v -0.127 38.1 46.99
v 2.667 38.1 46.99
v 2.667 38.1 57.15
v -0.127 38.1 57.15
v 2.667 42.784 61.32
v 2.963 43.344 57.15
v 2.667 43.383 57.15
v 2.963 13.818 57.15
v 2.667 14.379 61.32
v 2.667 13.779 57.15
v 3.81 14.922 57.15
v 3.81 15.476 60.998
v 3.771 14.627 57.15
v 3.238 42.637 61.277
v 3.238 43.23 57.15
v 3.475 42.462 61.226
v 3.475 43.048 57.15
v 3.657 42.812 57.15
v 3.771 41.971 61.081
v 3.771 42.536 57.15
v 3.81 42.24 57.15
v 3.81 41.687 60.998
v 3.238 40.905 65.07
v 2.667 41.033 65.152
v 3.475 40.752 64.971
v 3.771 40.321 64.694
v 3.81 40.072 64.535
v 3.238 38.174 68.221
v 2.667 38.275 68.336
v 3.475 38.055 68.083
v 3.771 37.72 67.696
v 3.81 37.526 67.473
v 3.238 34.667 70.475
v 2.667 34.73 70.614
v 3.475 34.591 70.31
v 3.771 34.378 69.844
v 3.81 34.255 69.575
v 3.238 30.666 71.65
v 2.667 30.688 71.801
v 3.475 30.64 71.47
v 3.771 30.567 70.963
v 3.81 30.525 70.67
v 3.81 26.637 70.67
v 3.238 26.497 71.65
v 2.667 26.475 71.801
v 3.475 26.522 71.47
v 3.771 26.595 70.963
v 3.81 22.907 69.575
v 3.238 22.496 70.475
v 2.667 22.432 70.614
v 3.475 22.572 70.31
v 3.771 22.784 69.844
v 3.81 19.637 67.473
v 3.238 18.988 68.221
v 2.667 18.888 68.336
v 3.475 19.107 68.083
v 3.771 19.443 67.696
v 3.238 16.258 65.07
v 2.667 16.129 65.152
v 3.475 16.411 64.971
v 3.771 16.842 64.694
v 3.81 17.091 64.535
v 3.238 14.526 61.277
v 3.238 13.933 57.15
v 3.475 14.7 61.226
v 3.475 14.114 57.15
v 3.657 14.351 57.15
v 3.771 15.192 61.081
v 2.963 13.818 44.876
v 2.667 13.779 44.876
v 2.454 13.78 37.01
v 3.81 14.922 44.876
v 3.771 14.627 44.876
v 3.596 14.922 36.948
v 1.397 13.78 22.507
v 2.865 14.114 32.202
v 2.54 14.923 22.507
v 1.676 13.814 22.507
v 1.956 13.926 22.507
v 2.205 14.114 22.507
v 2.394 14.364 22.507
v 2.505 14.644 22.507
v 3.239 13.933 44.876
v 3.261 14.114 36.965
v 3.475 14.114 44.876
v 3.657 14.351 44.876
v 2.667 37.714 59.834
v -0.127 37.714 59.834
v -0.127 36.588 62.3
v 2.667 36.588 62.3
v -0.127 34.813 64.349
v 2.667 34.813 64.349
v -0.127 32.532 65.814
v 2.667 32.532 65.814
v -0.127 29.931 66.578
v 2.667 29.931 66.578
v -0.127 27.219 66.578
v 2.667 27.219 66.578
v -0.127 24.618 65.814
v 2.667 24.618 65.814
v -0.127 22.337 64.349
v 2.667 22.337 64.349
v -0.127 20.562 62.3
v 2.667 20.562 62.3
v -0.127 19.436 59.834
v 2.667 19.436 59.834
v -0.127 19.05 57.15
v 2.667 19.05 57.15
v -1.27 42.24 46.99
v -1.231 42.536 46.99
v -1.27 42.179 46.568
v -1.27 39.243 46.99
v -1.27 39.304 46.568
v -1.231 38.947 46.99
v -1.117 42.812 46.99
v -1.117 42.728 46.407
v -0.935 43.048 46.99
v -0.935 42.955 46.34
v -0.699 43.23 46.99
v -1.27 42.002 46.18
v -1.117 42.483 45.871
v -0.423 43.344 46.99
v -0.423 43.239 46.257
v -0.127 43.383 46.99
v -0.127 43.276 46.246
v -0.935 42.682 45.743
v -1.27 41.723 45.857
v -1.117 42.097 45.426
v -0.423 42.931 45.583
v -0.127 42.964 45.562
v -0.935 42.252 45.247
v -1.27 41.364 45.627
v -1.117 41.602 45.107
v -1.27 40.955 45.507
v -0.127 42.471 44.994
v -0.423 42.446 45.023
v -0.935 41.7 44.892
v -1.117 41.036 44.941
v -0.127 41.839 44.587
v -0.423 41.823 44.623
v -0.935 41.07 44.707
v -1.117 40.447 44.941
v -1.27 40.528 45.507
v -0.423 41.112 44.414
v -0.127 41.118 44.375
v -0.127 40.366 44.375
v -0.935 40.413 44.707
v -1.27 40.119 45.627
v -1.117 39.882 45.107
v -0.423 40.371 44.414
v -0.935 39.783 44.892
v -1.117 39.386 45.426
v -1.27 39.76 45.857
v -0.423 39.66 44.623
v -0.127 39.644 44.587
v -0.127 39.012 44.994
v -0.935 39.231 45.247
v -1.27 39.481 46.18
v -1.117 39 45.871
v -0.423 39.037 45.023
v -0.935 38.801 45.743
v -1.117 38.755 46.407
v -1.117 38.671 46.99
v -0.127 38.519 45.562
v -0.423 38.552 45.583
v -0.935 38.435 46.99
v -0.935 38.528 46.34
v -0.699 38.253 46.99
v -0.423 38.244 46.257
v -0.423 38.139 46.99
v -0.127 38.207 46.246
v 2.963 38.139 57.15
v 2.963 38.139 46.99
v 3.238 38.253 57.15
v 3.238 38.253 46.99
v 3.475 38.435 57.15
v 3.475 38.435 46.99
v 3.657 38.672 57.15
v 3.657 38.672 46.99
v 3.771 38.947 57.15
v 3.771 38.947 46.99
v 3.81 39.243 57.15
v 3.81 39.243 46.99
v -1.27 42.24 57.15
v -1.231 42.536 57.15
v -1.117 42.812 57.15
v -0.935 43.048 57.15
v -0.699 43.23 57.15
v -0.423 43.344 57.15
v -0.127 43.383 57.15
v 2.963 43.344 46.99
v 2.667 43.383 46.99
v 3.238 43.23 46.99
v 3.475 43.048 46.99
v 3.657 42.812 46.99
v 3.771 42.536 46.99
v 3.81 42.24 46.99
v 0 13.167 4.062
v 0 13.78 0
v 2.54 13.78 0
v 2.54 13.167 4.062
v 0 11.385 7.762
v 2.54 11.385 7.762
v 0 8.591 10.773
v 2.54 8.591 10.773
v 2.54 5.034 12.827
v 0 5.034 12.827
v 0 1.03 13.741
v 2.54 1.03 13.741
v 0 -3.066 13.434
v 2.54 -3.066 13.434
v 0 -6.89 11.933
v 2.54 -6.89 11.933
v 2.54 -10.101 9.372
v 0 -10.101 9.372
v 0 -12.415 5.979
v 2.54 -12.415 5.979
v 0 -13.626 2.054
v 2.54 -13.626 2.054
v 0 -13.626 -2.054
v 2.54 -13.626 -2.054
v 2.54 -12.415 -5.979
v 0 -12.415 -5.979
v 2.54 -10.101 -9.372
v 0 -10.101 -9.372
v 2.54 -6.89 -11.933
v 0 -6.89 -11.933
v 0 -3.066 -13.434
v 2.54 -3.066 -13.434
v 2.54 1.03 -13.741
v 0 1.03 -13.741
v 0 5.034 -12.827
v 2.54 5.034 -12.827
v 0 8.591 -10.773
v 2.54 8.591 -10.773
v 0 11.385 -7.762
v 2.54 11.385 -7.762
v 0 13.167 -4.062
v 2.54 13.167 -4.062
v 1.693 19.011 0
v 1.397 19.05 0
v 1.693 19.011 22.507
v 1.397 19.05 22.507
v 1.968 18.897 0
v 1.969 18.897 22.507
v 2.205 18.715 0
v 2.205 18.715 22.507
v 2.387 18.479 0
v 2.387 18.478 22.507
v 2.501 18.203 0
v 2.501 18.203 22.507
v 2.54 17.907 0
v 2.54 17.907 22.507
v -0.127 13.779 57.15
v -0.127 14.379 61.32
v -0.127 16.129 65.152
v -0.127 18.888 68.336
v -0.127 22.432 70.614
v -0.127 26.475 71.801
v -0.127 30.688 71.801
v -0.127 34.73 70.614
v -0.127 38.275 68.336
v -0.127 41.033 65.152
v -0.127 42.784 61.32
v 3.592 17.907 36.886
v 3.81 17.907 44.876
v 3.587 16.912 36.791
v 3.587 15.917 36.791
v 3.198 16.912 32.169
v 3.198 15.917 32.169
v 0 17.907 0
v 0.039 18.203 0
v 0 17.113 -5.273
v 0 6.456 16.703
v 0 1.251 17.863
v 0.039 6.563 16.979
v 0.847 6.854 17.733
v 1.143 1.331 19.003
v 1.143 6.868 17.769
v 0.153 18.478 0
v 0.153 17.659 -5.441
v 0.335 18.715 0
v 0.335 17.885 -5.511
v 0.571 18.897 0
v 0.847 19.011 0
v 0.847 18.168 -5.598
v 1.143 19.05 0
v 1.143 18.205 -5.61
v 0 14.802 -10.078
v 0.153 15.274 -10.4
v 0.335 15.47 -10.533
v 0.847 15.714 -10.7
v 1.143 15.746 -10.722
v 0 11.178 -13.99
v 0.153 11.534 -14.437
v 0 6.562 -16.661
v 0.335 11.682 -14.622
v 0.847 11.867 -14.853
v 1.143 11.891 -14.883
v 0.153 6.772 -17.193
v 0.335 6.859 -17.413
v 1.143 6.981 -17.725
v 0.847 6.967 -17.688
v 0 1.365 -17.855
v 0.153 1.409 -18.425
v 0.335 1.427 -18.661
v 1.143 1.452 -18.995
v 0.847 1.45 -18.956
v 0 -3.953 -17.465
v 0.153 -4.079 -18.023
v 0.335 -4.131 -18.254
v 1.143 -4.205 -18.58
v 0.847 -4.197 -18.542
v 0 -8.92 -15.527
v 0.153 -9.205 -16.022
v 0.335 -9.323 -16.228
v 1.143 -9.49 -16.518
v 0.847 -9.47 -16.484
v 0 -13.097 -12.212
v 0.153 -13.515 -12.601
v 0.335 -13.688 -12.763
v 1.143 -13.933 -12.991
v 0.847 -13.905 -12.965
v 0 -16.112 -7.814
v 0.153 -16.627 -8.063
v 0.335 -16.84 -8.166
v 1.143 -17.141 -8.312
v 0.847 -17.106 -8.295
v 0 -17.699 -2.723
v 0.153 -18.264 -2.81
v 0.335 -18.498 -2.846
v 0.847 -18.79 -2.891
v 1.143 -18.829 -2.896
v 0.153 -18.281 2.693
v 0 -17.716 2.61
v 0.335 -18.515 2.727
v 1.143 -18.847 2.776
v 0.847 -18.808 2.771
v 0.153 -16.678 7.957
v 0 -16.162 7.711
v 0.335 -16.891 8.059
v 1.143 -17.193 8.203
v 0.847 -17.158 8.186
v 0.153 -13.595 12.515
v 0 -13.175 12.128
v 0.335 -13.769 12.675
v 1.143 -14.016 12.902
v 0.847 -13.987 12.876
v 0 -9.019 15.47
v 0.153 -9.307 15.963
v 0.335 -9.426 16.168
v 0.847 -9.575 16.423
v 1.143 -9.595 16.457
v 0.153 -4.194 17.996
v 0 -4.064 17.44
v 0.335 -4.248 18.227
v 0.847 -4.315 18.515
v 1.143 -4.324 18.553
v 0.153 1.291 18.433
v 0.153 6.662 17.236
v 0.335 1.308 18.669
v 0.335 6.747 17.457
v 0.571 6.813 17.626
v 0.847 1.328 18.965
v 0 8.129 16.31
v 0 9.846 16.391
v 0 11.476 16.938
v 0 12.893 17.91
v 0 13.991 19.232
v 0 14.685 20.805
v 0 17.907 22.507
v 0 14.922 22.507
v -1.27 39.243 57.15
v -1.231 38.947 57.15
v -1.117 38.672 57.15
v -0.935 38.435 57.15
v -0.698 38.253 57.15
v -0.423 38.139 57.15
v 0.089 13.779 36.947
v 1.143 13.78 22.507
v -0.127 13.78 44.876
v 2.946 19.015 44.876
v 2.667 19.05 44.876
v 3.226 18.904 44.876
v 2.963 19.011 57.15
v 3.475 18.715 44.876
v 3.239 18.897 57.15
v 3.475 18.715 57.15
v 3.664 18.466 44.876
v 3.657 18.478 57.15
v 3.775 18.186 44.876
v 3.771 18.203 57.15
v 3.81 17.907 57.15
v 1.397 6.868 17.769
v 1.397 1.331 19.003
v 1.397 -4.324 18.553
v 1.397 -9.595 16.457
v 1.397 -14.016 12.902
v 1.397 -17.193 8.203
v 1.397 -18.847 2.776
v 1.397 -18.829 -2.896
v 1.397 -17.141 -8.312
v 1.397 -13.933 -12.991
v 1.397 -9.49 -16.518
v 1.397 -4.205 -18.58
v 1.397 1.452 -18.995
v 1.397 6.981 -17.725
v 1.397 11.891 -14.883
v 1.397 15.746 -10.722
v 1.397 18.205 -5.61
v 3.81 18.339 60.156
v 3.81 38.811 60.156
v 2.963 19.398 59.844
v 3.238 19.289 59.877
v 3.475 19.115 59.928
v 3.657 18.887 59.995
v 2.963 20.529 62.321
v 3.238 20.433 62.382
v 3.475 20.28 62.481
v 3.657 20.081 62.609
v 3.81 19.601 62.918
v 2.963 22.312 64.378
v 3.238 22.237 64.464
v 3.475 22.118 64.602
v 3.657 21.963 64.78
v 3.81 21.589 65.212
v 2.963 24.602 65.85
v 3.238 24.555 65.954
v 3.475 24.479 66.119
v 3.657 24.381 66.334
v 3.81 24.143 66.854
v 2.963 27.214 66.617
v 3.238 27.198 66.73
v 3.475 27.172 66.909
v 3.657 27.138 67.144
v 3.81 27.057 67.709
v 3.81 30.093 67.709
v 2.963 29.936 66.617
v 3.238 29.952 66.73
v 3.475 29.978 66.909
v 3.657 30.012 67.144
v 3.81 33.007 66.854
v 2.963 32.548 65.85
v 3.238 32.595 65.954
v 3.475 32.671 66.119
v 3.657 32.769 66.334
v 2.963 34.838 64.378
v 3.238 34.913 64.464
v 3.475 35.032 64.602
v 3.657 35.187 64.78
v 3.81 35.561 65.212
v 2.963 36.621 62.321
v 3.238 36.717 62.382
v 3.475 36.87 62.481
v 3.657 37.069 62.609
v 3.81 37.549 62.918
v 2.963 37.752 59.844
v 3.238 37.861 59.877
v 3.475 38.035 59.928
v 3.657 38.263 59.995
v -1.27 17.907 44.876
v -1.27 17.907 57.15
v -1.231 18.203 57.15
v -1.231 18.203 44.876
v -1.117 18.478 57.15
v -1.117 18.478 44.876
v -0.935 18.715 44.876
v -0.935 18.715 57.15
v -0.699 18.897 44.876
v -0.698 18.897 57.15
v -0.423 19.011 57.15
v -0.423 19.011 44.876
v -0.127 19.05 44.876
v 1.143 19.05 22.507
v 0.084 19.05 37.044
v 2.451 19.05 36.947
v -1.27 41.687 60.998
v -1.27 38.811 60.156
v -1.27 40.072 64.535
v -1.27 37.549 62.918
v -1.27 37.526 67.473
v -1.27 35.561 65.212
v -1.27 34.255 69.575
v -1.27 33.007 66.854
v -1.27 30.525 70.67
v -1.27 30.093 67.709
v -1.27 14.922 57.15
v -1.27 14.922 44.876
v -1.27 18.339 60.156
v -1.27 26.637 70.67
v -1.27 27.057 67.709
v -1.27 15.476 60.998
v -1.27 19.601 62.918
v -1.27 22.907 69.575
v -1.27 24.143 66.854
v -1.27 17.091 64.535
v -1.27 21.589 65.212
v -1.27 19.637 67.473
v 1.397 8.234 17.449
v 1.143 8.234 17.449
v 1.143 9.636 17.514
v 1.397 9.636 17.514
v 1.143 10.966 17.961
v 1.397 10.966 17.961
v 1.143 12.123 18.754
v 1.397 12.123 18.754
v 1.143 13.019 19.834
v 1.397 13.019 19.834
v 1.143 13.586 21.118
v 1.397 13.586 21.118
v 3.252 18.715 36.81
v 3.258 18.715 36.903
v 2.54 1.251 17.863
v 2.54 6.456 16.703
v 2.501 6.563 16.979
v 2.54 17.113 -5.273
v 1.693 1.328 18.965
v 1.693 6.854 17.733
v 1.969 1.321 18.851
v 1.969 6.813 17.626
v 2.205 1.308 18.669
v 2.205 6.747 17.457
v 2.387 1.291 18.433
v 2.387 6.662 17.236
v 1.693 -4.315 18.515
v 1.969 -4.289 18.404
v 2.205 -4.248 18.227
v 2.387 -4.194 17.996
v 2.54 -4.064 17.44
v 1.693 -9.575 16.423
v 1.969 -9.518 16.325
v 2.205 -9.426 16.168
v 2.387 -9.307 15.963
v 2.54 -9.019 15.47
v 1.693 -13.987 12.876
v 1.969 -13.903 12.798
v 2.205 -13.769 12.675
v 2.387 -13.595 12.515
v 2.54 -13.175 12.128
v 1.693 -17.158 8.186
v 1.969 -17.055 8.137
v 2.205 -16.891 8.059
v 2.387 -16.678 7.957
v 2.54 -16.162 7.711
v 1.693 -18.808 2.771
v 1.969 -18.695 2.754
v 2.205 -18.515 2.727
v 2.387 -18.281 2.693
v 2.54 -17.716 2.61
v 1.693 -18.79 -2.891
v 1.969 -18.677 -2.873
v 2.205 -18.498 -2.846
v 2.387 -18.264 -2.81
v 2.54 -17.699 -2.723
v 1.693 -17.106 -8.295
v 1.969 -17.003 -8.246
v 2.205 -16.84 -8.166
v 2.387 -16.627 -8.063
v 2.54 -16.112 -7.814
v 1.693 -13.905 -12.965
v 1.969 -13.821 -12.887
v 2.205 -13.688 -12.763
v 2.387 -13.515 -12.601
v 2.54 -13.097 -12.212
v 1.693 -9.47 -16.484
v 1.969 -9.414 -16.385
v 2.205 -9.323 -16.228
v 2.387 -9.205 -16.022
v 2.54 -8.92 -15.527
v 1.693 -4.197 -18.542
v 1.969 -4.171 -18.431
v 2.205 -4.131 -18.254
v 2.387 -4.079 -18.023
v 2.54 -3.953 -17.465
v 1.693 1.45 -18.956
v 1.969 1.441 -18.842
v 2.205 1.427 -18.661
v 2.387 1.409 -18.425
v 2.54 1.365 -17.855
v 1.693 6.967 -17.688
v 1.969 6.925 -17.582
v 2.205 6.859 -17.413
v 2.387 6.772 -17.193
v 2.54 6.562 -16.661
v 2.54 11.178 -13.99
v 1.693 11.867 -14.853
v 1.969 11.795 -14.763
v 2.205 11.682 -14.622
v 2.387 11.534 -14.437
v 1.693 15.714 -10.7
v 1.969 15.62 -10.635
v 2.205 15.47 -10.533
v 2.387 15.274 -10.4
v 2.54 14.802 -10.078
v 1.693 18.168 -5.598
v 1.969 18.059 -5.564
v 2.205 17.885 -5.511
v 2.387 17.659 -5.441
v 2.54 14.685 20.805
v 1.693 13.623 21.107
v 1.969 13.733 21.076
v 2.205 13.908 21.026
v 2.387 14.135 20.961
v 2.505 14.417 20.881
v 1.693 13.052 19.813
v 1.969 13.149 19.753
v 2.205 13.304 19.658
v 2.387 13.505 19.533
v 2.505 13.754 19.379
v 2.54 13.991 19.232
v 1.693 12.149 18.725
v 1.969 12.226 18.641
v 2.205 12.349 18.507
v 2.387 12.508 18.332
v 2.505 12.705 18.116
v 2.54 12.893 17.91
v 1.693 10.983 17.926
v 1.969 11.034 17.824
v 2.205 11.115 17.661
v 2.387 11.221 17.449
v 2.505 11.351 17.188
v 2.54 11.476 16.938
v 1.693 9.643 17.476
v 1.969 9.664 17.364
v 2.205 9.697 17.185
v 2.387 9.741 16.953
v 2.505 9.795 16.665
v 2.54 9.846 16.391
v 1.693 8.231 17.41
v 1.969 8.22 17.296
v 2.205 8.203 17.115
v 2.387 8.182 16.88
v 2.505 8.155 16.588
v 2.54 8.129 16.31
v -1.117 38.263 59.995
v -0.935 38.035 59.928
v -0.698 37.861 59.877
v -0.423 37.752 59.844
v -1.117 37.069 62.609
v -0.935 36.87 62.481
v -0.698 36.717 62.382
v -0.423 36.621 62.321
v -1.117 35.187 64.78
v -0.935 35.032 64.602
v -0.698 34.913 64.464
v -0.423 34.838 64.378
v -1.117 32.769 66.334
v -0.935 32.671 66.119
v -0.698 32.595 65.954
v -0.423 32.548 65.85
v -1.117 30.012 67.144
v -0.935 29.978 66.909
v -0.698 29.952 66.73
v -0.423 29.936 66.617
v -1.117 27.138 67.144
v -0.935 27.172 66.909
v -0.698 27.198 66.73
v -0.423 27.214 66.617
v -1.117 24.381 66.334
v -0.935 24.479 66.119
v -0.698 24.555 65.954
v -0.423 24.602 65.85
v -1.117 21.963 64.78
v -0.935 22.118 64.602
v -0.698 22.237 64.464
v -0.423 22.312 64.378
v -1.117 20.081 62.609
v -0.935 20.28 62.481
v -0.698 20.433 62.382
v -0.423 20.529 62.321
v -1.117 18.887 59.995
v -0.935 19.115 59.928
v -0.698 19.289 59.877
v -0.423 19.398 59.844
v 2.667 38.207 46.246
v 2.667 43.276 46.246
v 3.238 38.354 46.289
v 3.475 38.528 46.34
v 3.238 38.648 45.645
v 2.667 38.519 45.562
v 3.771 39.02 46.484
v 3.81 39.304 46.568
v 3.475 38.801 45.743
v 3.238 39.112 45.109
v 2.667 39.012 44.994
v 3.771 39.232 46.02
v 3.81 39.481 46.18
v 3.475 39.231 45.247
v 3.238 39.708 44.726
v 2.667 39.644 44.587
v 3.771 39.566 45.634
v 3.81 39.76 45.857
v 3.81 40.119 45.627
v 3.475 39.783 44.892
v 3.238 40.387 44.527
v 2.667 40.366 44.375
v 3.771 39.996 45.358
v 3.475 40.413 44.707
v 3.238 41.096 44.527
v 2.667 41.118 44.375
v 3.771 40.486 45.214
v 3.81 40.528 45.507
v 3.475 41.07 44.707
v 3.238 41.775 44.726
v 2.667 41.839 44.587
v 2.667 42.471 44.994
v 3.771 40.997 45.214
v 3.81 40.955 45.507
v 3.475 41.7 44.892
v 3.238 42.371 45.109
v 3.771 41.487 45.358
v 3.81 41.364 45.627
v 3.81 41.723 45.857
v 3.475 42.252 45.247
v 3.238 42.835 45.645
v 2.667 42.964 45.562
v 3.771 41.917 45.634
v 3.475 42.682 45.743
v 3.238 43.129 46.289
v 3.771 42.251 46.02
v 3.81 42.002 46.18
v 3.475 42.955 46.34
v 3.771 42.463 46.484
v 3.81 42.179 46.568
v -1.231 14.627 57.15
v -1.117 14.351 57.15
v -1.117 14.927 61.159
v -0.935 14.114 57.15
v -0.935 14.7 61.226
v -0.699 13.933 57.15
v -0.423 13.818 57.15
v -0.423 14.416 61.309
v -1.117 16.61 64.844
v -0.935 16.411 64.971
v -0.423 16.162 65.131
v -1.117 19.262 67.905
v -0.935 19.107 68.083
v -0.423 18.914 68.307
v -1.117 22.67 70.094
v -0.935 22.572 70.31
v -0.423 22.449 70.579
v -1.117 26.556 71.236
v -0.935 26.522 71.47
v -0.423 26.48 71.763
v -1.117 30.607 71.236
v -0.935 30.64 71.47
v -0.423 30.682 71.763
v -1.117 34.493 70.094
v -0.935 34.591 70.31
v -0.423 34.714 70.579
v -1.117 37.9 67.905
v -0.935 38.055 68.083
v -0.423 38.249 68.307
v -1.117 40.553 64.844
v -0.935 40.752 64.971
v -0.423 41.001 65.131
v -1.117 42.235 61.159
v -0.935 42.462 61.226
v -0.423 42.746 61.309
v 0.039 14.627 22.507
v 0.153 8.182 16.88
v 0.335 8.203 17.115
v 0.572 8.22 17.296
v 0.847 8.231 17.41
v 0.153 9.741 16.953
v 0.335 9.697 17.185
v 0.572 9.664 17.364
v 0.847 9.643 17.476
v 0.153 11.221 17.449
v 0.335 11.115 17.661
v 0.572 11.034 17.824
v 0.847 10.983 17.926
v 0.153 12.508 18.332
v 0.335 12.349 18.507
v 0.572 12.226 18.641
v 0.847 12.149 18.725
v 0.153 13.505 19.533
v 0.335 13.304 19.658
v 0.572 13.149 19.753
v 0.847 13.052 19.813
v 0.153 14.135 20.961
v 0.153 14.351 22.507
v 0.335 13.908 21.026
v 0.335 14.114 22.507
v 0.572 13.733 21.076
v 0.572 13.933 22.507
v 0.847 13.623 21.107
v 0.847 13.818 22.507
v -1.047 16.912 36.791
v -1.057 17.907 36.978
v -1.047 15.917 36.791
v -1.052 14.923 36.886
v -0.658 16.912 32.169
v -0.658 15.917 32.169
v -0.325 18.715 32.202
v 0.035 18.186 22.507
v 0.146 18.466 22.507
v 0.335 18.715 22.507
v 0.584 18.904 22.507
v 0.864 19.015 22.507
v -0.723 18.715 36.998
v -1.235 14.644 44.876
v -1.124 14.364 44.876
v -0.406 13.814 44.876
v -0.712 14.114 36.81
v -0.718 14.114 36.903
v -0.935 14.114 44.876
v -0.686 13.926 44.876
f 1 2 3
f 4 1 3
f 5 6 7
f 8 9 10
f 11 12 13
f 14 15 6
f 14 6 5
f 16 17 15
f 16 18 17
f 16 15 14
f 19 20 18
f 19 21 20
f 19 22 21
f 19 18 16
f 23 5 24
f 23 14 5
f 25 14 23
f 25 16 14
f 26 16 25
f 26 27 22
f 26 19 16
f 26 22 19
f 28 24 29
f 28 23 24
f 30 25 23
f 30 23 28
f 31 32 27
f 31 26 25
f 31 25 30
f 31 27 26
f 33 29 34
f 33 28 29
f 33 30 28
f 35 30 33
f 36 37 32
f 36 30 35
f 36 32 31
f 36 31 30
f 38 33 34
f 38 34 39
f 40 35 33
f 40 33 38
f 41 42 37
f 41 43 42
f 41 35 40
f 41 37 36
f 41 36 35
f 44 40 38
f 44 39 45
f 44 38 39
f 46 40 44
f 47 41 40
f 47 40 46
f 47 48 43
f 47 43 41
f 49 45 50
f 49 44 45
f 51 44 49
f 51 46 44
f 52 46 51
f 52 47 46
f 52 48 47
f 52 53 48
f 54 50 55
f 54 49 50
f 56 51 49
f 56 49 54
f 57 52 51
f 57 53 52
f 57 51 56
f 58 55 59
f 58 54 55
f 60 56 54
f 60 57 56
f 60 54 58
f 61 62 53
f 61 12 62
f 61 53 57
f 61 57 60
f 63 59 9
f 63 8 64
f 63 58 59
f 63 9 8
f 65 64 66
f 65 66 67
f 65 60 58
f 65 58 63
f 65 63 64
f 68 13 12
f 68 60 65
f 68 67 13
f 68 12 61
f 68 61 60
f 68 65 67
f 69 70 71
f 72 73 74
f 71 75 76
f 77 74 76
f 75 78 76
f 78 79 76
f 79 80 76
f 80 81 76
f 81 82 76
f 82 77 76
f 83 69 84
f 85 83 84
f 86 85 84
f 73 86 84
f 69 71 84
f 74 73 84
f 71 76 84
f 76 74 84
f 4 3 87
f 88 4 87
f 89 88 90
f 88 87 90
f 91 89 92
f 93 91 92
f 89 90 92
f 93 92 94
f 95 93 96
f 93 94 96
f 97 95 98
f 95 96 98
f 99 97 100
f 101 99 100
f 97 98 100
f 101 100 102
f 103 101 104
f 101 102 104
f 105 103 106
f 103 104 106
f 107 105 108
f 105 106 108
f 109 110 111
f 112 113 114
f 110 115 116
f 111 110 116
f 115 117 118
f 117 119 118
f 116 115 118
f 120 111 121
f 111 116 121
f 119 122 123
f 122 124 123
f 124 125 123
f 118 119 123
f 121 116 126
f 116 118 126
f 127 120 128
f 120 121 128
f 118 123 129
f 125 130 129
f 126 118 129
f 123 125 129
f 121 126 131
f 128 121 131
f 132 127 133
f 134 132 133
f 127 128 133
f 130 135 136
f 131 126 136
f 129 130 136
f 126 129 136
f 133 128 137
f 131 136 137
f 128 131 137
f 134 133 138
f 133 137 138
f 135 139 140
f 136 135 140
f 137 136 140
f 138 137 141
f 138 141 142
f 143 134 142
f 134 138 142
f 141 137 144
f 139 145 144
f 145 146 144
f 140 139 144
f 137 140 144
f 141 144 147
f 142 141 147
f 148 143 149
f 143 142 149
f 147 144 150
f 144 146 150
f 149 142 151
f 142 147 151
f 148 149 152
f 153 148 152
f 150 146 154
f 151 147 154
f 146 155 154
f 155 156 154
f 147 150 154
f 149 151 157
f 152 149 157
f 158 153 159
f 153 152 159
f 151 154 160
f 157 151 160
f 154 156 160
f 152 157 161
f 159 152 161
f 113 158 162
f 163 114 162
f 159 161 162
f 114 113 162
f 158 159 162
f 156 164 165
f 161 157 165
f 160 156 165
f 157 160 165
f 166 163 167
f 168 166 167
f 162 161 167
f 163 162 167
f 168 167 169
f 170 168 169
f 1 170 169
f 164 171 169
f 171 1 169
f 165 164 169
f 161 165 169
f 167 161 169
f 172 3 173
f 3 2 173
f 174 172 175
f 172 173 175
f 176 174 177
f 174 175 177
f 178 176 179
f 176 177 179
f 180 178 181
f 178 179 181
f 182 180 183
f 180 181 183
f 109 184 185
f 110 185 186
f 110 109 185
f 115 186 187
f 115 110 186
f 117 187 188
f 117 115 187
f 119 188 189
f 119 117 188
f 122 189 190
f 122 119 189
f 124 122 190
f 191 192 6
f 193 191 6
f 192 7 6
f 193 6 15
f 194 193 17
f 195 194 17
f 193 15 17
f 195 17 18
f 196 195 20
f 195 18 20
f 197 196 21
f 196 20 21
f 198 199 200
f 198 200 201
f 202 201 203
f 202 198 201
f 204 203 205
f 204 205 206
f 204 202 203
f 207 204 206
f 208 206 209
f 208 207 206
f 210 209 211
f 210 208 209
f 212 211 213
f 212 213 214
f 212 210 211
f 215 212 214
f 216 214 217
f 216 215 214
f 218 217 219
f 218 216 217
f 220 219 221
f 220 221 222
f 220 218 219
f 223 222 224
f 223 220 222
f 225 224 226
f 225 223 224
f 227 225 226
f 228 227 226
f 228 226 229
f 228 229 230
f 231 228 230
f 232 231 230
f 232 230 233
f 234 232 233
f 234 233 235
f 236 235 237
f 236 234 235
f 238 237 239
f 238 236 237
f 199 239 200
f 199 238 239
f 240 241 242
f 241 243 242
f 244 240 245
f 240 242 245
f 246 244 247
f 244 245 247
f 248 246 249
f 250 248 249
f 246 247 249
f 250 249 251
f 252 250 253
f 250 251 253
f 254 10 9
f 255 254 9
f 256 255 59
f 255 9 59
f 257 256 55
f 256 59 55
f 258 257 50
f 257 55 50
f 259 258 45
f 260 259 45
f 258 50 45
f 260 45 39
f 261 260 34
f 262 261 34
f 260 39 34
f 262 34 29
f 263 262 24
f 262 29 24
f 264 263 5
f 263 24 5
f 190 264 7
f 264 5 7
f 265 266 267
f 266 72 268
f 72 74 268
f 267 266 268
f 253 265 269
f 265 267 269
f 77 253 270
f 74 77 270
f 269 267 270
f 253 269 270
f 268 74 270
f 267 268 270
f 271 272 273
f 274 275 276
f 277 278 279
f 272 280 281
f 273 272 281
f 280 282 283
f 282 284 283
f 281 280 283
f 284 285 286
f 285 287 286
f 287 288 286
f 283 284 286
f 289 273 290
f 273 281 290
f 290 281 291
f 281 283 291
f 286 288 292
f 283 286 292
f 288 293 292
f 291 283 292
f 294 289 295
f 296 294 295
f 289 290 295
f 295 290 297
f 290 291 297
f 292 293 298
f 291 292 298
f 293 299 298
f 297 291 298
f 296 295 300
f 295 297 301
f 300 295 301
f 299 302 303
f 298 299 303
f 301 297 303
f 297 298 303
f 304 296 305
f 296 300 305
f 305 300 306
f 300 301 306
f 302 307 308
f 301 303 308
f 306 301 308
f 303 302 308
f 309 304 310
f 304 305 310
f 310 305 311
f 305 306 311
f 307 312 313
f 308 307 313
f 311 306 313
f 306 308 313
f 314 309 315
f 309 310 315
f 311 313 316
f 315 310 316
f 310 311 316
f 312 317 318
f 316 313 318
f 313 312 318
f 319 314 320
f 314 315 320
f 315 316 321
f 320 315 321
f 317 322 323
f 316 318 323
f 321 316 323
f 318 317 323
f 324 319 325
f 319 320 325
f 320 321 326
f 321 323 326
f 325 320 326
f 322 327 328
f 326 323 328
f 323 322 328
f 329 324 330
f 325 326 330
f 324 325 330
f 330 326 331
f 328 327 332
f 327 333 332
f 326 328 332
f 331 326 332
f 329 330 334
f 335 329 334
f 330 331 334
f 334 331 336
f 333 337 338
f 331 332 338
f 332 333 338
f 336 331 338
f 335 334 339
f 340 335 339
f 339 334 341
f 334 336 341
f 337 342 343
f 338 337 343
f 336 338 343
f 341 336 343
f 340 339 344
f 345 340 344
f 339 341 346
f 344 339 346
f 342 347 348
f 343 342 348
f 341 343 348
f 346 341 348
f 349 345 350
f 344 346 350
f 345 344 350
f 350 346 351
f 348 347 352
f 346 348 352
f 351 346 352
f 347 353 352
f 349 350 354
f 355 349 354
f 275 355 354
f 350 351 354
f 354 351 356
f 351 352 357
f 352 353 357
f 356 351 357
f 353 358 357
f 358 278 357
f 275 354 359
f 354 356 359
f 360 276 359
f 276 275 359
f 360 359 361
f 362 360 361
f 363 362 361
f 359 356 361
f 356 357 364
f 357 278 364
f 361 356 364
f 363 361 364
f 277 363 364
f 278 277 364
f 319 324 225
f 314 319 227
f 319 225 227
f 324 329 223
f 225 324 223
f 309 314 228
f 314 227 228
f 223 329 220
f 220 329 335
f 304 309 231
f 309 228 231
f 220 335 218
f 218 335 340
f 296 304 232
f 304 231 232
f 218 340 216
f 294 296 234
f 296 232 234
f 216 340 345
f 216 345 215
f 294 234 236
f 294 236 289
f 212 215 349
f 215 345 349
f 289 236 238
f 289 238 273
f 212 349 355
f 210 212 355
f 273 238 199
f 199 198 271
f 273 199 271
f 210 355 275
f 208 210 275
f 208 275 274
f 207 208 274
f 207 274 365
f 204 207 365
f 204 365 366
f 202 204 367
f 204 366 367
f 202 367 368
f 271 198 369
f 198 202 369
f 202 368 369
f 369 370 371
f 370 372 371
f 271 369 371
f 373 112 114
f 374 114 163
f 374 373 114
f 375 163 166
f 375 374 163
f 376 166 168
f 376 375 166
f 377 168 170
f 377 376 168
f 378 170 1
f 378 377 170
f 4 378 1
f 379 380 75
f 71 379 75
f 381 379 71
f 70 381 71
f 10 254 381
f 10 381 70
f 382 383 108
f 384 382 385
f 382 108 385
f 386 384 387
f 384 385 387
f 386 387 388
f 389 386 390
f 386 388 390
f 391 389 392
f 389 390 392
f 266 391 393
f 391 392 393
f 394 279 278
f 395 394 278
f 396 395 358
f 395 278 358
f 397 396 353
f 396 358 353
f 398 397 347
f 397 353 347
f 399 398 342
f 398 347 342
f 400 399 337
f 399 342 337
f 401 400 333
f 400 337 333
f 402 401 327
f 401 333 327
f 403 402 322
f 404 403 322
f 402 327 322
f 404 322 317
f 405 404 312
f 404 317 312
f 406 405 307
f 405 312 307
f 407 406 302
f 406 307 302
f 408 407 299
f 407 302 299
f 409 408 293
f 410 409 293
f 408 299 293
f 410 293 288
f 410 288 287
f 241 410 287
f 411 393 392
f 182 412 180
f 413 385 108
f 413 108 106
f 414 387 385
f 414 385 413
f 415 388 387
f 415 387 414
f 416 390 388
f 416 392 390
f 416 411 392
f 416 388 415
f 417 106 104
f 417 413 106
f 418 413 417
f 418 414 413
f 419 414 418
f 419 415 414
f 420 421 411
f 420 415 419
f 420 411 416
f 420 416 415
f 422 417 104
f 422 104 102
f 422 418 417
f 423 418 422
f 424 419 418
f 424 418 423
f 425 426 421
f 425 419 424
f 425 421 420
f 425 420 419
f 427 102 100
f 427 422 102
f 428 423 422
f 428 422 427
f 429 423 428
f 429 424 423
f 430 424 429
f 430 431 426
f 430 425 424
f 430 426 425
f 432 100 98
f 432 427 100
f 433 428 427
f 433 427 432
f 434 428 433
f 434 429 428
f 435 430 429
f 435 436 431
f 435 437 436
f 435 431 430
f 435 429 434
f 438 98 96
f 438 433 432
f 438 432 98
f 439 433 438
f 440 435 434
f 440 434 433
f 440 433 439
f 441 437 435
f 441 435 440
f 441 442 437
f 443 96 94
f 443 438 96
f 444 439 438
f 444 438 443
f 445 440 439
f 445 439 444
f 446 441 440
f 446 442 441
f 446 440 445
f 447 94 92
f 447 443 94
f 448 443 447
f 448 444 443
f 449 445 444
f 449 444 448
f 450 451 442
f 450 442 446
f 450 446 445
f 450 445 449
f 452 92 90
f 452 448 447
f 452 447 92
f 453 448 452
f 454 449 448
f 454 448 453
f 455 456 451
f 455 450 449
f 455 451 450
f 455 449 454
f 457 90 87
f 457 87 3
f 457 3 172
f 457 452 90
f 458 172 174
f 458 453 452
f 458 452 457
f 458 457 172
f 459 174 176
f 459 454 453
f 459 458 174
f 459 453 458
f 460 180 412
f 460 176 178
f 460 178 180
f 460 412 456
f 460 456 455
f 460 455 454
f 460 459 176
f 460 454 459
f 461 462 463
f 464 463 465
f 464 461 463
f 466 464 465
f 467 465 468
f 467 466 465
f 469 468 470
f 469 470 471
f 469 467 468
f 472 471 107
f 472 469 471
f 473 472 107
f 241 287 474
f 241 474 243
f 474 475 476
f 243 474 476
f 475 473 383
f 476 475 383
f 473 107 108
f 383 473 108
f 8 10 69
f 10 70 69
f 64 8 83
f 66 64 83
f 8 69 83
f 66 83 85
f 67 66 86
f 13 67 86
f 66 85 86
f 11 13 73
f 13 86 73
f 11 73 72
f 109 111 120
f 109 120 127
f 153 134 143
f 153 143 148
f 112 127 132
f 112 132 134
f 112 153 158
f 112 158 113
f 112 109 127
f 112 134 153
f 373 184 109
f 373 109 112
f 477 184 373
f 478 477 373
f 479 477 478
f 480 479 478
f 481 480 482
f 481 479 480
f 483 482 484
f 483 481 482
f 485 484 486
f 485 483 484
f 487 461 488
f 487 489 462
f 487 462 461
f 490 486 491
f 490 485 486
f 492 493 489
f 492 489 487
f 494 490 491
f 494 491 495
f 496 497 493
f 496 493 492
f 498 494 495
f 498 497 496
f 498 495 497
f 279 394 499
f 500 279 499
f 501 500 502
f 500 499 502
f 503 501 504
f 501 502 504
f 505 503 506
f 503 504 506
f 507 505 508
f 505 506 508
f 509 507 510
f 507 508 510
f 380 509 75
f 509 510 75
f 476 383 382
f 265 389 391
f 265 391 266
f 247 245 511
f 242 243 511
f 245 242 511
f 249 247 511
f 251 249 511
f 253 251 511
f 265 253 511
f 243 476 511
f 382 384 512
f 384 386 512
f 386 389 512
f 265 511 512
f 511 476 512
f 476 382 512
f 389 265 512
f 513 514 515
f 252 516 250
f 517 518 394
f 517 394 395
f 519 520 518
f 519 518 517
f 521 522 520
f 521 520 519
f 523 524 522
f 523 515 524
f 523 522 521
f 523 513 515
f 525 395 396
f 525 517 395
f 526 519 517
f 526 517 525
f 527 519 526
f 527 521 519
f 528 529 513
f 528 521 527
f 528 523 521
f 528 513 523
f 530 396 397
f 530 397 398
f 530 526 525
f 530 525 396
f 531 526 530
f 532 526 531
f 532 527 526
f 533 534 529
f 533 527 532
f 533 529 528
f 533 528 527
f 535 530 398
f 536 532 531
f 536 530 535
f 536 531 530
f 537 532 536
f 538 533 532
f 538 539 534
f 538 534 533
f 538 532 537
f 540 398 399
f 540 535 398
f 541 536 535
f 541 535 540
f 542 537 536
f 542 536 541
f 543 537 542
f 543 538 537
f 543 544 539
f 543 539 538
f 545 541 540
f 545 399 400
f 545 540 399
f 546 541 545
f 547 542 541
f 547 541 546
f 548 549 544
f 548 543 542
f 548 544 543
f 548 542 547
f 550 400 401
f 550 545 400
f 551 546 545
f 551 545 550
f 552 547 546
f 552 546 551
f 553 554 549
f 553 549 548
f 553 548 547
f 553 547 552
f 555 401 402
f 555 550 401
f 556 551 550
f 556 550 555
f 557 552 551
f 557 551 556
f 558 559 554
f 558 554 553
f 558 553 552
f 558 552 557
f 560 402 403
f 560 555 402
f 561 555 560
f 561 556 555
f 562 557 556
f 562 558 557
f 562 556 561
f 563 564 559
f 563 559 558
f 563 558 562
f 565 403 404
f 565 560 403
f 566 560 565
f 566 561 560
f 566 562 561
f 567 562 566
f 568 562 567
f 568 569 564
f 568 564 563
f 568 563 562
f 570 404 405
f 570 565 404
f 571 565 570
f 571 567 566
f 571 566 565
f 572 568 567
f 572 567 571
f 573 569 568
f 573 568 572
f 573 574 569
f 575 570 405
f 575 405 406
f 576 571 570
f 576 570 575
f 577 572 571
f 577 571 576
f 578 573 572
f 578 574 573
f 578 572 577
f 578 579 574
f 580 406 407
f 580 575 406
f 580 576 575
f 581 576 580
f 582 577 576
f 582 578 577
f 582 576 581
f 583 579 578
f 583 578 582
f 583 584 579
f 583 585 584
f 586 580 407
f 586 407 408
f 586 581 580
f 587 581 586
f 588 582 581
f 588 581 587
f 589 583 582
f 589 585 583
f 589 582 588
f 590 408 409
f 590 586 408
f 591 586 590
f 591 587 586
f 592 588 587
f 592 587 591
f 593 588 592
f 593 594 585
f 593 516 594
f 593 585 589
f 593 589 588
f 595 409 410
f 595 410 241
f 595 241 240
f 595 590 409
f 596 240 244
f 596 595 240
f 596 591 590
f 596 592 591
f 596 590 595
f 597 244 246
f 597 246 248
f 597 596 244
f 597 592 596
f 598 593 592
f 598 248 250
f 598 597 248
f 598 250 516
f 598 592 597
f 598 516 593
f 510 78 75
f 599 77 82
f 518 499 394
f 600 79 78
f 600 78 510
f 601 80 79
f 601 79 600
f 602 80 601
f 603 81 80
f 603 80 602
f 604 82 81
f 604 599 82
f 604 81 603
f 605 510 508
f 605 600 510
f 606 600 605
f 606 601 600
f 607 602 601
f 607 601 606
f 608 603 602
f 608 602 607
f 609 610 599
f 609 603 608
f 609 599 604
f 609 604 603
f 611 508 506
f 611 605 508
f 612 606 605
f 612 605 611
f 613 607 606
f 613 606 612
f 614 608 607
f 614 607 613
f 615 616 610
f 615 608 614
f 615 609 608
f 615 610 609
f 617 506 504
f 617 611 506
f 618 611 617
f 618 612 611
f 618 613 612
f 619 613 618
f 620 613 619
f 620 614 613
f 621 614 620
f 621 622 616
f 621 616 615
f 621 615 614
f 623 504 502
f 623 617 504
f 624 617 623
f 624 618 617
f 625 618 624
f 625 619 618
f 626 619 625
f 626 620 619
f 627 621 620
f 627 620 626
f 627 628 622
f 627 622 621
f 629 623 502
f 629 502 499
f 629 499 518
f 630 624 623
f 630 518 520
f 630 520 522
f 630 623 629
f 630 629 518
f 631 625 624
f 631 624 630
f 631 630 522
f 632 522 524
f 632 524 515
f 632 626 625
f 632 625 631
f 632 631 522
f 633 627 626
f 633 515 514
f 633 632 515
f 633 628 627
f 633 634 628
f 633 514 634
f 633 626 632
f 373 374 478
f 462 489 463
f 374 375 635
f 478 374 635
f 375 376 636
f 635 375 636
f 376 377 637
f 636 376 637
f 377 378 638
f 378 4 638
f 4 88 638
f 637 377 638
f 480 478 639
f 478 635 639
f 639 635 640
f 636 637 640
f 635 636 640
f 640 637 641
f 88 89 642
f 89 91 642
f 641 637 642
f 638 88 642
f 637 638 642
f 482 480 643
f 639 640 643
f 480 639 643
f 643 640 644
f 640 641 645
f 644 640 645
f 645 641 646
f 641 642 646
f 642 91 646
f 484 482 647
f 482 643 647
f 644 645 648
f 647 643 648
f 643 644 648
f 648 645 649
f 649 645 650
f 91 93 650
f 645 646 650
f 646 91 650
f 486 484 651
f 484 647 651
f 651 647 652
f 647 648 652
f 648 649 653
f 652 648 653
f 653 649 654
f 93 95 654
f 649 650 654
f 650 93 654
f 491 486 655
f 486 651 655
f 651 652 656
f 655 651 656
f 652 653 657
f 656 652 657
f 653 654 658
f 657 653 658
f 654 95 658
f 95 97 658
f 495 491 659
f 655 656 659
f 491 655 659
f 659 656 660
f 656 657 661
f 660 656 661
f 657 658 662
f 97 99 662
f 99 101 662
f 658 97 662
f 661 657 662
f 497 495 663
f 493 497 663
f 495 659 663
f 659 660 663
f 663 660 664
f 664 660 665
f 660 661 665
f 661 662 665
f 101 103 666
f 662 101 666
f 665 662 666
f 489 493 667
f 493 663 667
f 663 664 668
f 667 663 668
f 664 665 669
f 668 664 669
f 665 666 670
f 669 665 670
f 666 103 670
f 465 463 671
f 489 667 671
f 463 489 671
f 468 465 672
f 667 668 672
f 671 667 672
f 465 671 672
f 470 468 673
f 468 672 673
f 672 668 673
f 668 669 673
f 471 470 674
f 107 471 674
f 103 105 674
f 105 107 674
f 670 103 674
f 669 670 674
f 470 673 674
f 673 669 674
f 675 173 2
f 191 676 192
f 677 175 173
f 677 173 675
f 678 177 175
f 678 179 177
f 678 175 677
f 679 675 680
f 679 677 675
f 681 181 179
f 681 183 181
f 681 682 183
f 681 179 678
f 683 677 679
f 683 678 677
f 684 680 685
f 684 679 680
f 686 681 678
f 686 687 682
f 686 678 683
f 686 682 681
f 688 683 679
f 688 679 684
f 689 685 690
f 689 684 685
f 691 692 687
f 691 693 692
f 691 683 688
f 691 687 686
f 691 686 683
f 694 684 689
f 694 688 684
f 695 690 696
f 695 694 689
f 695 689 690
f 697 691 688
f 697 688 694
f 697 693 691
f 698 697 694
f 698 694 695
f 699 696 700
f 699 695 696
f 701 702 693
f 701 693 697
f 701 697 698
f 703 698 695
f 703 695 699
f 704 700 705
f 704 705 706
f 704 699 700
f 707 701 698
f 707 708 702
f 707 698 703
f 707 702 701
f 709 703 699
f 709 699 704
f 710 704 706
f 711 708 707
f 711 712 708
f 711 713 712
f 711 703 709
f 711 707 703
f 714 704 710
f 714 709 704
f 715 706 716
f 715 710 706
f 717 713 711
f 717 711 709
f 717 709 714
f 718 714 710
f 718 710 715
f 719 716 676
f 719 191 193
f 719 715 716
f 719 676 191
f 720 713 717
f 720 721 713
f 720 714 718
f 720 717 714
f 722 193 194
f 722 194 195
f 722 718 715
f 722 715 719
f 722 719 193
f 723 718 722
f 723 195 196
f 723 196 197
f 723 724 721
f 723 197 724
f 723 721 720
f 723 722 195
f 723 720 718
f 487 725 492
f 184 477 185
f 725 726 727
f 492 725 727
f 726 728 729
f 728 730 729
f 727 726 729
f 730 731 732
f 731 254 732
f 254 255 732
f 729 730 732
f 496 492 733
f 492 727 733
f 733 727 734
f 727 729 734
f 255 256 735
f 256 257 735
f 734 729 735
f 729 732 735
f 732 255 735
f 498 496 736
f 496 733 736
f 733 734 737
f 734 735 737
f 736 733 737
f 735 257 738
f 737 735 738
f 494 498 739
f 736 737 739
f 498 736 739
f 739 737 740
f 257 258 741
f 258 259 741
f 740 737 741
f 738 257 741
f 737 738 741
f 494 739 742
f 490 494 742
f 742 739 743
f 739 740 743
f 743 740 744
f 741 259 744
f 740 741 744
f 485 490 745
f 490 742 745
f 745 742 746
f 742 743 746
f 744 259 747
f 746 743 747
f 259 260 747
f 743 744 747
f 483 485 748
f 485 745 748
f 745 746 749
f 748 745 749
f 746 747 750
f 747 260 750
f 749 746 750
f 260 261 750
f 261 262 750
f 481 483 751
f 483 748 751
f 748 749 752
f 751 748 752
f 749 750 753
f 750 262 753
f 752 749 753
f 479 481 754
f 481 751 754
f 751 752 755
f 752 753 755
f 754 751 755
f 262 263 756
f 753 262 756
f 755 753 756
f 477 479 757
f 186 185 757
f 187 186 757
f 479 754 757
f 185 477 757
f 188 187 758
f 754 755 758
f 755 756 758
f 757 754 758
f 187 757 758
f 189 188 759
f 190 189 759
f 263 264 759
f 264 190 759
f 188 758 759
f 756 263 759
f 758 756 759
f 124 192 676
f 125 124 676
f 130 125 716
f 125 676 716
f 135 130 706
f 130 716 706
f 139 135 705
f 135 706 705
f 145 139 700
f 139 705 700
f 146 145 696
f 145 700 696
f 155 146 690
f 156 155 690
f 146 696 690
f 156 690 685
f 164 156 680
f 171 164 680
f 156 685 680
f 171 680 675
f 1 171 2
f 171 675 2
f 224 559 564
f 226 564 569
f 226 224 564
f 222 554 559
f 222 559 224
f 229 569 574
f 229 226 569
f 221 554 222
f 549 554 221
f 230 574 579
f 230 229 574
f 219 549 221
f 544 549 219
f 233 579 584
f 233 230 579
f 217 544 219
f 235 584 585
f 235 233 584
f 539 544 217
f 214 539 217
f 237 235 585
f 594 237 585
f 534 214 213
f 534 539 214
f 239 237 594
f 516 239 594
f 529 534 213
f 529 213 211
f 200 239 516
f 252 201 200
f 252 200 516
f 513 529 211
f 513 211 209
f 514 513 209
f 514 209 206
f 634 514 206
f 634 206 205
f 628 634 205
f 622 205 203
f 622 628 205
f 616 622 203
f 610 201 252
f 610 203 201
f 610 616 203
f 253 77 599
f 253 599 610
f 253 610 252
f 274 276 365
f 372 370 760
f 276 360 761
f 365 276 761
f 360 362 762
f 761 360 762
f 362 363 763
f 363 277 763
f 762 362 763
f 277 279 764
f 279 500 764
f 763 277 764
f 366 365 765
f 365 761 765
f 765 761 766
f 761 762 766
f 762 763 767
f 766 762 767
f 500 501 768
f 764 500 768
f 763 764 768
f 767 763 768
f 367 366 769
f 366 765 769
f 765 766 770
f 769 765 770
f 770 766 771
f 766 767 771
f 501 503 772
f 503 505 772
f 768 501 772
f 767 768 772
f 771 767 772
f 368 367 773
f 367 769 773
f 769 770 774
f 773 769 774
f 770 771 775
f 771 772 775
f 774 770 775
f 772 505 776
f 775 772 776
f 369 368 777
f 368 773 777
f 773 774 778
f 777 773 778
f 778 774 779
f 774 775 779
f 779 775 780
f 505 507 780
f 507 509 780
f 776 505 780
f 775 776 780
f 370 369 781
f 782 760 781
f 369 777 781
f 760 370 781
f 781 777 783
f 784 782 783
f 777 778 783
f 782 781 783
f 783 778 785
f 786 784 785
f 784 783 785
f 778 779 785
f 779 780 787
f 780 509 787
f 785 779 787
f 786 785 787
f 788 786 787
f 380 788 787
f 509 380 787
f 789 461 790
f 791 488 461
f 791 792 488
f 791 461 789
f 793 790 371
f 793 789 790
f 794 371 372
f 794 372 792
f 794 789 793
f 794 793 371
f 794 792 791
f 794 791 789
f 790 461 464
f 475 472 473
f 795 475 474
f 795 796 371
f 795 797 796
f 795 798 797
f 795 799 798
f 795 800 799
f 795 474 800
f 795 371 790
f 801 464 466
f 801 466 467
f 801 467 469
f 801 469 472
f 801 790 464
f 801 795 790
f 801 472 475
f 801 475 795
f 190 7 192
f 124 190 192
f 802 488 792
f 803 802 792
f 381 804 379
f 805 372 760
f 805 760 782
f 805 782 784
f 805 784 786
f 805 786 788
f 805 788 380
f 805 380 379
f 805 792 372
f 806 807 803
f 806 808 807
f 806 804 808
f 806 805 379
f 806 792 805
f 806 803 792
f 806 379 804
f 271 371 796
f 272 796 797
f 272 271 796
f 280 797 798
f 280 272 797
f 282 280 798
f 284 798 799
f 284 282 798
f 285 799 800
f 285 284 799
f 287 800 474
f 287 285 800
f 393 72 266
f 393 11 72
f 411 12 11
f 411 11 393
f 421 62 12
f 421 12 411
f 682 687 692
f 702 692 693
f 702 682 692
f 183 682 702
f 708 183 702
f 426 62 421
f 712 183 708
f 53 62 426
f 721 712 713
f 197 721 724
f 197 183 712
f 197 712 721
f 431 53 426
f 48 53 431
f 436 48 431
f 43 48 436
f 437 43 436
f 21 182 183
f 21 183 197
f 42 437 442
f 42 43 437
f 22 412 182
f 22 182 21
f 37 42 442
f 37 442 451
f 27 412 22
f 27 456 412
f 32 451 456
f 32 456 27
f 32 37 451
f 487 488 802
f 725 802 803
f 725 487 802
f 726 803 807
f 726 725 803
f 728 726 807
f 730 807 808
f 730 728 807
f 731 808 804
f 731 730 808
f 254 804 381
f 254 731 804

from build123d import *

# Parameters (mm, degrees)
F0_R     = 13.7795
F1_DEPTH = 2.54
F2_R     = 5.08
F4_DEPTH = 1.27
F6_DEPTH = 1.27
F8_DEPTH = 5.2705
F9_R     = 1.143


with BuildPart() as f1:
    # F0 (on Right) → F1 (new body)
    with BuildSketch(Plane.YZ):
        with BuildLine():
            ThreePointArc((19.05, 0), (17.6833534009, 7.0853025694), (13.7795, 13.1540062243))
            ThreePointArc((13.7795, 13.1540062243), (-17.6833534009, -7.0853025694), (19.05, 0))
        make_face()
        Circle(F0_R, mode=Mode.SUBTRACT)
        with BuildLine():
            Line((13.7795, 57.15), (13.7795, 13.1540062243))
            ThreePointArc((13.7795, 13.1540062243), (17.6833534009, 7.0853025694), (19.05, 0))
            Line((19.05, 0), (19.05, 57.15))
            ThreePointArc((19.05, 57.15), (28.575, 66.675), (38.1, 57.15))
            Line((38.1, 57.15), (38.1, 46.99))
            ThreePointArc((38.1, 46.99), (40.7416, 44.3484), (43.3832, 46.99))
            Line((43.3832, 46.99), (43.3832, 57.15))
            ThreePointArc((43.3832, 57.15), (28.58135, 71.95185), (13.7795, 57.15))
        make_face()
    extrude(amount=F1_DEPTH)

    # F2
    f2_edges = [f1.edges().sort_by_distance(p)[0] for p in [
        (1.27, 13.7795, 13.154006),
    ]]
    fillet(f2_edges, radius=F2_R)

    # F3 (on face) → F4 (join)
    with BuildSketch(Plane.YZ.offset(2.54)):
        with BuildLine():
            Line((13.7795, 44.8760166764), (19.05, 44.8760166764))
            Line((19.05, 44.8760166764), (19.05, 57.15))
            ThreePointArc((19.05, 57.15), (28.575, 66.675), (38.1, 57.15))
            Line((38.1, 57.15), (38.1, 46.99))
            ThreePointArc((38.1, 46.99), (40.7416, 44.3484), (43.3832, 46.99))
            Line((43.3832, 46.99), (43.3832, 57.15))
            ThreePointArc((43.3832, 57.15), (28.58135, 71.95185), (13.7795, 57.15))
            Line((13.7795, 57.15), (13.7795, 44.8760166764))
        make_face()
    extrude(amount=F4_DEPTH)

    # F5 (on face) → F6 (join)
    with BuildSketch(Plane(origin=(0, 0, 0), x_dir=(0, -1, 0), z_dir=(-1, 0, 0))):
        with BuildLine():
            Line((-19.05, 57.15), (-19.05, 44.8760166764))
            Line((-19.05, 44.8760166764), (-13.7795, 44.8760166764))
            Line((-13.7795, 44.8760166764), (-13.7795, 57.15))
            ThreePointArc((-13.7795, 57.15), (-28.58135, 71.95185), (-43.3832, 57.15))
            Line((-43.3832, 57.15), (-43.3832, 46.99))
            ThreePointArc((-43.3832, 46.99), (-40.7416, 44.3484), (-38.1, 46.99))
            Line((-38.1, 46.99), (-38.1, 57.15))
            ThreePointArc((-38.1, 57.15), (-28.575, 66.675), (-19.05, 57.15))
        make_face()
    extrude(amount=F6_DEPTH)

    # F7 (on face) → F8 (join, through all)
    with BuildSketch(Plane.XZ.offset(-13.7795)):
        with BuildLine():
            Line((0, 44.8760166764), (-1.27, 44.8760166764))
            add(Edge.make_bspline(
                [(-1.27, 44.8760166764), (-1.27, 41.9389868527), (-1.1001096664, 36.6914165172), (-0.673724923, 32.307052024), (0, 25.5389690077), (0, 22.507234387)],
                knots=[0, 0, 0, 0, 0.3506949739, 0.6162581597, 1, 1, 1, 1], degree=3))
            Line((0, 22.507234387), (0, 44.8760166764))
        make_face()
        with BuildLine():
            Line((2.54, 44.8760166764), (2.54, 22.507234387))
            add(Edge.make_bspline(
                [(3.81, 44.8760166764), (3.81, 41.9389868527), (3.6401096664, 36.6914165172), (3.213724923, 32.307052024), (2.54, 25.5389690077), (2.54, 22.507234387)],
                knots=[0, 0, 0, 0, 0.3506949739, 0.6162581597, 1, 1, 1, 1], degree=3))
            Line((3.81, 44.8760166764), (2.54, 44.8760166764))
        make_face()
    extrude(amount=-F8_DEPTH)

    # F9
    f9_edges = [f1.edges().sort_by_distance(p)[0] for p in [
        (-1.27, 28.575, 66.675),
        (3.81, 28.58135, 71.95185),
    ]]
    fillet(f9_edges, radius=F9_R)


solid = f1.part
